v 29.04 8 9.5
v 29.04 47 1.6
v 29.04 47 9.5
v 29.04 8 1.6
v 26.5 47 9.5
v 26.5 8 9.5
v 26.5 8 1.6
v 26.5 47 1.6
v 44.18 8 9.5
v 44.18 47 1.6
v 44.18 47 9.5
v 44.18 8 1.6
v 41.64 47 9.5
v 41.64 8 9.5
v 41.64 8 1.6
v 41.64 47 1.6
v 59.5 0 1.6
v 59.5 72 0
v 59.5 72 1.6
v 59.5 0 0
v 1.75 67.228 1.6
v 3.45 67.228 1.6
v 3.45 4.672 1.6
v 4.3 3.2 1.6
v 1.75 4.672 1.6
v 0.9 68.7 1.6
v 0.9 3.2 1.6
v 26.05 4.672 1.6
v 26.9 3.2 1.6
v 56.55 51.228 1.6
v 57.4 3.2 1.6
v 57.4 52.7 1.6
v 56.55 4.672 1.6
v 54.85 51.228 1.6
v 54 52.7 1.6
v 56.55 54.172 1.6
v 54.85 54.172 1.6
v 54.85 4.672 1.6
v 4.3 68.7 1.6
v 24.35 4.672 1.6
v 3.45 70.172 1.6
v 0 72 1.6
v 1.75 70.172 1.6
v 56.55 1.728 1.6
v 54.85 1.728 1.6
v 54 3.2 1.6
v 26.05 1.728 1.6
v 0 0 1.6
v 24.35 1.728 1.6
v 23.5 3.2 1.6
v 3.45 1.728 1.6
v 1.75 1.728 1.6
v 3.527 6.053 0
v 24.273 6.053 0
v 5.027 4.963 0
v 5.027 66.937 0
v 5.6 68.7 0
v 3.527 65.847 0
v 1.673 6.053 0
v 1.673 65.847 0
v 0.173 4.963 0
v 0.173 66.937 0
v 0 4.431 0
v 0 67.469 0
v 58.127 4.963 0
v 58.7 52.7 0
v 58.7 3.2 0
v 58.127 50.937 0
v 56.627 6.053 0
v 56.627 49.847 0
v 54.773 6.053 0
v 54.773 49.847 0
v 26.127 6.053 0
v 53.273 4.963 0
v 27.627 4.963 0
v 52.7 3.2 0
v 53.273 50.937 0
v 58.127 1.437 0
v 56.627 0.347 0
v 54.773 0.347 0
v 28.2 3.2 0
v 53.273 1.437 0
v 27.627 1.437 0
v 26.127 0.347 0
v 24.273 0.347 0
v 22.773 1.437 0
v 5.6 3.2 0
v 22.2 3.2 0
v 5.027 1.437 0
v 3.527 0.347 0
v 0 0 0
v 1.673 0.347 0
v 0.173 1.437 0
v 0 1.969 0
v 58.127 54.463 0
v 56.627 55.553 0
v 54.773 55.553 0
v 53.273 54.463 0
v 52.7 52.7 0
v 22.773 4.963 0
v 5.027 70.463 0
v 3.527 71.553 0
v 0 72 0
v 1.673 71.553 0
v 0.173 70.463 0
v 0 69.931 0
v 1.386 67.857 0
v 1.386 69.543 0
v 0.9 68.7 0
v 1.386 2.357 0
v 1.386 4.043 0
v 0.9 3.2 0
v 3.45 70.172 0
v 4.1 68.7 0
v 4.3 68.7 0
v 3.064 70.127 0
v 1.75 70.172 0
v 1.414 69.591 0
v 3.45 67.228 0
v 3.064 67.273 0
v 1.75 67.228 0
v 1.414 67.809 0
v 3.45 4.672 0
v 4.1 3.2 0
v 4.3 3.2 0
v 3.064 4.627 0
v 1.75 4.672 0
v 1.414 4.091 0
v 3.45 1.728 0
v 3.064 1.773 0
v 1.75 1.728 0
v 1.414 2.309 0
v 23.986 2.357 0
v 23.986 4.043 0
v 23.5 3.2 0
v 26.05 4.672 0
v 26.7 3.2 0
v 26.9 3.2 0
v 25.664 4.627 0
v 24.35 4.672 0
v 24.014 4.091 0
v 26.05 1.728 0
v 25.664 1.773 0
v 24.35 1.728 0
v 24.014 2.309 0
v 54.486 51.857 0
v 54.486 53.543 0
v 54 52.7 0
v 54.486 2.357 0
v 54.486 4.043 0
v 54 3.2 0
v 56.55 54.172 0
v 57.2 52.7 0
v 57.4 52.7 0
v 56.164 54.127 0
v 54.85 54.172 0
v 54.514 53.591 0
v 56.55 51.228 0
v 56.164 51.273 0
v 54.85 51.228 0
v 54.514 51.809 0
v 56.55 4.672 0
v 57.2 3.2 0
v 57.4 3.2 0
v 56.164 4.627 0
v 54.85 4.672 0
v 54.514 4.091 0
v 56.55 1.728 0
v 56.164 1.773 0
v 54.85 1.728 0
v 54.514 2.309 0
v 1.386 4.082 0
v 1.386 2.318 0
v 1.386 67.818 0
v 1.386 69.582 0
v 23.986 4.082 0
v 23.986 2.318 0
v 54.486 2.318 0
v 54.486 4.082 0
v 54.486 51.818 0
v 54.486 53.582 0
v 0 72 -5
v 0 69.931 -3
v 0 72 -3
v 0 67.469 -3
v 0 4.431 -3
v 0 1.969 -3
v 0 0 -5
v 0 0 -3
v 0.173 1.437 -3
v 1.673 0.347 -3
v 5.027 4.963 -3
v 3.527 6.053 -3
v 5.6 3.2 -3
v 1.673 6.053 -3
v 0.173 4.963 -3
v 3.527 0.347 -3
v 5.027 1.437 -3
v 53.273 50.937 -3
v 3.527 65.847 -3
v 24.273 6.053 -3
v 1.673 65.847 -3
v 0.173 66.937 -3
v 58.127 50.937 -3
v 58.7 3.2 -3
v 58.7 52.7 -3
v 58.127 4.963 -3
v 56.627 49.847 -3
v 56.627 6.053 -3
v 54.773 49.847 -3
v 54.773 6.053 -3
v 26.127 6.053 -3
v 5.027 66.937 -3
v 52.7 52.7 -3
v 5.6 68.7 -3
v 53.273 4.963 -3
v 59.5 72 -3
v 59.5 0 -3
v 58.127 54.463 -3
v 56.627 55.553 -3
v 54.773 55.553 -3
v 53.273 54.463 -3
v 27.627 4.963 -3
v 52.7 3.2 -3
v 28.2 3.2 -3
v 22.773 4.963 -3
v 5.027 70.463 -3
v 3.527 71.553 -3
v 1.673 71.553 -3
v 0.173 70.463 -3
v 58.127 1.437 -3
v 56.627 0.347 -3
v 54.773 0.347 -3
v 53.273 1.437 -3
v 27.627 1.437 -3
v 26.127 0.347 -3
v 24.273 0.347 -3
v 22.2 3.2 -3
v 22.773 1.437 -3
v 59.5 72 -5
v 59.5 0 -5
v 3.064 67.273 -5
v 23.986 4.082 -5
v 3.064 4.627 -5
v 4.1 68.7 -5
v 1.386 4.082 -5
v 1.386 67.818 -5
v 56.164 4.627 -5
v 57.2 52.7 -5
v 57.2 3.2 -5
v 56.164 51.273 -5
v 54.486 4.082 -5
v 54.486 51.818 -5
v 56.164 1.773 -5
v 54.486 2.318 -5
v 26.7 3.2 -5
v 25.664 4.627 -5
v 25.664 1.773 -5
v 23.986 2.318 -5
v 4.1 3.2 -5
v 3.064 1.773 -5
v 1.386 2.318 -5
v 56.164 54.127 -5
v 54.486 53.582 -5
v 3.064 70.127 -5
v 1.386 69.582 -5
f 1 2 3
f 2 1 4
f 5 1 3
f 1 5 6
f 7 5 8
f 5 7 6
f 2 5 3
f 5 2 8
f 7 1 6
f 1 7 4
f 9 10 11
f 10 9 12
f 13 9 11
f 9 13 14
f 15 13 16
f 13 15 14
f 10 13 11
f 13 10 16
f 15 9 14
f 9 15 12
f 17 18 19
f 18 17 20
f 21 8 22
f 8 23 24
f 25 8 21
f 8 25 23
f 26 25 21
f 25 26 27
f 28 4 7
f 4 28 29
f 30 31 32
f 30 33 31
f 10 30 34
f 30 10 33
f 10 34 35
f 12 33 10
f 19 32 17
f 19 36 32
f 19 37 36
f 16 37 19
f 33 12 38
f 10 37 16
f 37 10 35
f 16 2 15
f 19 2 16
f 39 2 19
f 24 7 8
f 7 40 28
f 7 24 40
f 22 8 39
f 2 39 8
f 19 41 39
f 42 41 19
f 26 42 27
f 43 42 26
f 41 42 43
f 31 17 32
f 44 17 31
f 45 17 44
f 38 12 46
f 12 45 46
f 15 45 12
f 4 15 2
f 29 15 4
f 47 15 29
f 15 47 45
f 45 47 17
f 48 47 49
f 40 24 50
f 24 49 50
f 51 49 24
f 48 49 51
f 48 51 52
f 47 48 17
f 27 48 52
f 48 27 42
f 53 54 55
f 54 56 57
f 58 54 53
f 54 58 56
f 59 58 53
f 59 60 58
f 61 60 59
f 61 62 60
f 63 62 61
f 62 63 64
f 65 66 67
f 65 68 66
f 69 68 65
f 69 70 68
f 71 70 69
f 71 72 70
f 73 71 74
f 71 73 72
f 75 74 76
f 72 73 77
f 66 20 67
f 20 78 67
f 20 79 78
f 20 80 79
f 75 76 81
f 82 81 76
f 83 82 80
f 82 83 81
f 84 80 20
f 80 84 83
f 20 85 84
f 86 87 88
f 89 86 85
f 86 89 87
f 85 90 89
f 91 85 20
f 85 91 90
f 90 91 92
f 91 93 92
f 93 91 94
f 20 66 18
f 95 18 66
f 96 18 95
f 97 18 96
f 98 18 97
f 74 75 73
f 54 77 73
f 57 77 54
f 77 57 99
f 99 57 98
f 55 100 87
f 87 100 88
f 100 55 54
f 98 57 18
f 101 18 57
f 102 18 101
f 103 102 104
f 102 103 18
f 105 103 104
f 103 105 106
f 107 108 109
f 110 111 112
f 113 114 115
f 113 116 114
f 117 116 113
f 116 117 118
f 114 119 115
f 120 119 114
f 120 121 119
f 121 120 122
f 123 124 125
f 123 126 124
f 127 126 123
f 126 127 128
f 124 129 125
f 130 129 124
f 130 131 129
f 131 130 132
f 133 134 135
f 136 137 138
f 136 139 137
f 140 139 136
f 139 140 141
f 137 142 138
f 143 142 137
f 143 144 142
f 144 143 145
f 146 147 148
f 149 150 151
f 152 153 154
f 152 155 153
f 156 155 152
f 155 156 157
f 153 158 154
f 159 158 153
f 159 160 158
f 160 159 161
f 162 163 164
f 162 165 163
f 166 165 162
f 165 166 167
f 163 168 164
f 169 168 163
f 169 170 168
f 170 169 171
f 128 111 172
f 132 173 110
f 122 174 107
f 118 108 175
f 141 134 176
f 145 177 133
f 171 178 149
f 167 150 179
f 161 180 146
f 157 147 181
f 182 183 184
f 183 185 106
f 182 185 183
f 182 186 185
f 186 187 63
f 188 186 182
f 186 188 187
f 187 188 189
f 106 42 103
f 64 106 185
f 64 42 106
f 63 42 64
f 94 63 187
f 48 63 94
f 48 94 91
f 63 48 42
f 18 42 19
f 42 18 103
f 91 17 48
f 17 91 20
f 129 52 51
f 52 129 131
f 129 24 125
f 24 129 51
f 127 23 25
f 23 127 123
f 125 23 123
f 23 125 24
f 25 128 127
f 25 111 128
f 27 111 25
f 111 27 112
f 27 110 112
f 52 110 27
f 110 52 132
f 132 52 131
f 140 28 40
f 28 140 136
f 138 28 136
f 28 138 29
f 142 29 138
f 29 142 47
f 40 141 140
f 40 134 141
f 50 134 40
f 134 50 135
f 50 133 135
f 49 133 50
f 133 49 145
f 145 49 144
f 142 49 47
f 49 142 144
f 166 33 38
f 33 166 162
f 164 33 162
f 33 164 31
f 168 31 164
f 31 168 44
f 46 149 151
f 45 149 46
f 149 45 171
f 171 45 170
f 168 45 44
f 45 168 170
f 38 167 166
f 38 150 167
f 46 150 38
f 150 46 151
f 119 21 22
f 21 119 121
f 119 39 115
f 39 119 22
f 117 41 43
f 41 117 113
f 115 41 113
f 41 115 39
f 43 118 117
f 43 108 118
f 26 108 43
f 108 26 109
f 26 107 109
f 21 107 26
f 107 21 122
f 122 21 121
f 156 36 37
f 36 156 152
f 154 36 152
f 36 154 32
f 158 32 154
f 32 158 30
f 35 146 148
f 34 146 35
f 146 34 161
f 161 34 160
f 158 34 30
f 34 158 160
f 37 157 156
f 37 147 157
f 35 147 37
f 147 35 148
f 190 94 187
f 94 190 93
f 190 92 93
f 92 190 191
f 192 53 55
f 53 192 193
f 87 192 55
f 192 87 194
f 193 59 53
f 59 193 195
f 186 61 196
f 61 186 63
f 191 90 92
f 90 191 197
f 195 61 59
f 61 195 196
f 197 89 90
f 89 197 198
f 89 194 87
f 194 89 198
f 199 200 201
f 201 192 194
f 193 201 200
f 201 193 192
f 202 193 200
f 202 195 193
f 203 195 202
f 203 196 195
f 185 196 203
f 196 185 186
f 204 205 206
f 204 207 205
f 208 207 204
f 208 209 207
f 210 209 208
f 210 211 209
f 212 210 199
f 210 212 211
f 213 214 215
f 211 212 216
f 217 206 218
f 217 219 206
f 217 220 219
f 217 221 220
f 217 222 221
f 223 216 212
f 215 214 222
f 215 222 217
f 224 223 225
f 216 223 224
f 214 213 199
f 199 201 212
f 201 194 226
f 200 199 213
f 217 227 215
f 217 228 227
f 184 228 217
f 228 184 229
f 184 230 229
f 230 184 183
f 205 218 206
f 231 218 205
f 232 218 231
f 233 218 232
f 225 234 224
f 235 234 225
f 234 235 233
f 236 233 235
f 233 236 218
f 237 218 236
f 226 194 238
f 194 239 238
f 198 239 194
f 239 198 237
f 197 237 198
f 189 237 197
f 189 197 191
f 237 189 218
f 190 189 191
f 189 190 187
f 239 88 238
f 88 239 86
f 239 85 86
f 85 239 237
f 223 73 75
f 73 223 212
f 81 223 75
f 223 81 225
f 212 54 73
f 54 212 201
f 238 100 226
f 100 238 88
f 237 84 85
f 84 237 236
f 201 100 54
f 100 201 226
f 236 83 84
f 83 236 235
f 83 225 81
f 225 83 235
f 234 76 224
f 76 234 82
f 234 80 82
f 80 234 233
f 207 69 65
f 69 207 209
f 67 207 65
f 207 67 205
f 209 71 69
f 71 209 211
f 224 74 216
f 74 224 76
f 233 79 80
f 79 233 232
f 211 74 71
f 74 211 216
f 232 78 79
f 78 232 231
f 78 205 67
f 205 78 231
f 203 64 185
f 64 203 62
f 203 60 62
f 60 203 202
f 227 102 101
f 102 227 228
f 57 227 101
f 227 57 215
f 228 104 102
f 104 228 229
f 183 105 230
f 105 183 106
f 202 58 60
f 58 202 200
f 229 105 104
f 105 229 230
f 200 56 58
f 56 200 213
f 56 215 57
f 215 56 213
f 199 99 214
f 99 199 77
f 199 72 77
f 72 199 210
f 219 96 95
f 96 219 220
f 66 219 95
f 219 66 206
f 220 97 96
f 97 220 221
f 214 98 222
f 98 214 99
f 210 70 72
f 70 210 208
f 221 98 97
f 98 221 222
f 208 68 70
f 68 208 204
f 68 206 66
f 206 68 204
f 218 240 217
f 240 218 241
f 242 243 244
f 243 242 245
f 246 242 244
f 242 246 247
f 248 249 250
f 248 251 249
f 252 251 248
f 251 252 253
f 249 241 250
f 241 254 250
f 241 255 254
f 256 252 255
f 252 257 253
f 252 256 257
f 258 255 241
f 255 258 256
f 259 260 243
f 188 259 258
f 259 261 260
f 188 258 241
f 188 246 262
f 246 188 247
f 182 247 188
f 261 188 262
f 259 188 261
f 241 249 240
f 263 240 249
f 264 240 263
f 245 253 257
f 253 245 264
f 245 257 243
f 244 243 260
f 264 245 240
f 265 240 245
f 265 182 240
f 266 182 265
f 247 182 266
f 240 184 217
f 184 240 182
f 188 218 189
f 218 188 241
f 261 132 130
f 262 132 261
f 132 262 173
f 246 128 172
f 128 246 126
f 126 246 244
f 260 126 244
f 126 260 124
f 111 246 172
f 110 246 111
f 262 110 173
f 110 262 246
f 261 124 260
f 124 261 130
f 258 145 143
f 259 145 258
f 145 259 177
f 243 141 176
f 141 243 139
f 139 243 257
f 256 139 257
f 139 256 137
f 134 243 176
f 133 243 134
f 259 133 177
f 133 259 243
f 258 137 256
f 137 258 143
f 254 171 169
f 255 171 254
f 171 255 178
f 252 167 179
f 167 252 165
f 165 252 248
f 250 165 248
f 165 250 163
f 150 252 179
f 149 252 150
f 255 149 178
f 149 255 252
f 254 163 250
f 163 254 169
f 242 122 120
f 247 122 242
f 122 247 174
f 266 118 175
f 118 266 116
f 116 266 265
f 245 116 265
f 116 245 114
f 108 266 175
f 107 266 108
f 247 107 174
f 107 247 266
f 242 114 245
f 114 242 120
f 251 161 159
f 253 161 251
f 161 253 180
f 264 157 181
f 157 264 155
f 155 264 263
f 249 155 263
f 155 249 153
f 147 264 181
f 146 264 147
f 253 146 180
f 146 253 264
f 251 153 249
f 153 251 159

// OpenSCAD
module cncControlNanoBody(){
    //pcb max dimensions, not the contour
    color([0.85,0,0.0])
        cube([59.5, 72, 1.6]);
    //socket headers for ardiuno
    color([0,0,0]){
        translate([26.5, 8,1]){
            cube([2.54, 39, 8.5]);
            translate([2.54+12.6, 0, 0])
                cube([2.54, 39, 8.5]);
        }
    }
}

module cncControlNanoHolePattern(r,h){
    rr = 3.4/2;
    translate([0.9+rr, 1.5+rr, 0]){
        cylinder(h, r, r);
    }
    
    translate([23.5+rr, 1.5+rr, 0]){
        cylinder(h, r, r);
    }
    
    translate([54+rr, 1.5+rr, 0]){
        cylinder(h, r, r);
    }
    
    translate([0.9+rr, 67+rr, 0]){
        cylinder(h, r, r);
    }
    
    translate([54+rr, 51+rr, 0]){
        cylinder(h, r, r);
    }
}

module cncControlNanoModule(){
    difference(){
        cncControlNanoBody();
        translate([0, 0, -1])
            cncControlNanoHolePattern(3.4/2, 3);
    }
}

module cncControlNanoFixture(r, th){
    difference(){
        intersection(){
            translate([0,0,-3]){
                cncControlNanoHolePattern(6/2, 3);
                translate([0,0,3-th])
                    cube([59.5, 72, th-3]);
            }
            translate([0, 0, 0-3-th])
                cube([59.5, 72, th+3+0.5]);
        }
        
        translate([0, 0, 0-3-th-1])
            cncControlNanoHolePattern(r, 3+th+2);
        }
}
cncControlNanoModule();
cncControlNanoFixture(3/2, 5);
